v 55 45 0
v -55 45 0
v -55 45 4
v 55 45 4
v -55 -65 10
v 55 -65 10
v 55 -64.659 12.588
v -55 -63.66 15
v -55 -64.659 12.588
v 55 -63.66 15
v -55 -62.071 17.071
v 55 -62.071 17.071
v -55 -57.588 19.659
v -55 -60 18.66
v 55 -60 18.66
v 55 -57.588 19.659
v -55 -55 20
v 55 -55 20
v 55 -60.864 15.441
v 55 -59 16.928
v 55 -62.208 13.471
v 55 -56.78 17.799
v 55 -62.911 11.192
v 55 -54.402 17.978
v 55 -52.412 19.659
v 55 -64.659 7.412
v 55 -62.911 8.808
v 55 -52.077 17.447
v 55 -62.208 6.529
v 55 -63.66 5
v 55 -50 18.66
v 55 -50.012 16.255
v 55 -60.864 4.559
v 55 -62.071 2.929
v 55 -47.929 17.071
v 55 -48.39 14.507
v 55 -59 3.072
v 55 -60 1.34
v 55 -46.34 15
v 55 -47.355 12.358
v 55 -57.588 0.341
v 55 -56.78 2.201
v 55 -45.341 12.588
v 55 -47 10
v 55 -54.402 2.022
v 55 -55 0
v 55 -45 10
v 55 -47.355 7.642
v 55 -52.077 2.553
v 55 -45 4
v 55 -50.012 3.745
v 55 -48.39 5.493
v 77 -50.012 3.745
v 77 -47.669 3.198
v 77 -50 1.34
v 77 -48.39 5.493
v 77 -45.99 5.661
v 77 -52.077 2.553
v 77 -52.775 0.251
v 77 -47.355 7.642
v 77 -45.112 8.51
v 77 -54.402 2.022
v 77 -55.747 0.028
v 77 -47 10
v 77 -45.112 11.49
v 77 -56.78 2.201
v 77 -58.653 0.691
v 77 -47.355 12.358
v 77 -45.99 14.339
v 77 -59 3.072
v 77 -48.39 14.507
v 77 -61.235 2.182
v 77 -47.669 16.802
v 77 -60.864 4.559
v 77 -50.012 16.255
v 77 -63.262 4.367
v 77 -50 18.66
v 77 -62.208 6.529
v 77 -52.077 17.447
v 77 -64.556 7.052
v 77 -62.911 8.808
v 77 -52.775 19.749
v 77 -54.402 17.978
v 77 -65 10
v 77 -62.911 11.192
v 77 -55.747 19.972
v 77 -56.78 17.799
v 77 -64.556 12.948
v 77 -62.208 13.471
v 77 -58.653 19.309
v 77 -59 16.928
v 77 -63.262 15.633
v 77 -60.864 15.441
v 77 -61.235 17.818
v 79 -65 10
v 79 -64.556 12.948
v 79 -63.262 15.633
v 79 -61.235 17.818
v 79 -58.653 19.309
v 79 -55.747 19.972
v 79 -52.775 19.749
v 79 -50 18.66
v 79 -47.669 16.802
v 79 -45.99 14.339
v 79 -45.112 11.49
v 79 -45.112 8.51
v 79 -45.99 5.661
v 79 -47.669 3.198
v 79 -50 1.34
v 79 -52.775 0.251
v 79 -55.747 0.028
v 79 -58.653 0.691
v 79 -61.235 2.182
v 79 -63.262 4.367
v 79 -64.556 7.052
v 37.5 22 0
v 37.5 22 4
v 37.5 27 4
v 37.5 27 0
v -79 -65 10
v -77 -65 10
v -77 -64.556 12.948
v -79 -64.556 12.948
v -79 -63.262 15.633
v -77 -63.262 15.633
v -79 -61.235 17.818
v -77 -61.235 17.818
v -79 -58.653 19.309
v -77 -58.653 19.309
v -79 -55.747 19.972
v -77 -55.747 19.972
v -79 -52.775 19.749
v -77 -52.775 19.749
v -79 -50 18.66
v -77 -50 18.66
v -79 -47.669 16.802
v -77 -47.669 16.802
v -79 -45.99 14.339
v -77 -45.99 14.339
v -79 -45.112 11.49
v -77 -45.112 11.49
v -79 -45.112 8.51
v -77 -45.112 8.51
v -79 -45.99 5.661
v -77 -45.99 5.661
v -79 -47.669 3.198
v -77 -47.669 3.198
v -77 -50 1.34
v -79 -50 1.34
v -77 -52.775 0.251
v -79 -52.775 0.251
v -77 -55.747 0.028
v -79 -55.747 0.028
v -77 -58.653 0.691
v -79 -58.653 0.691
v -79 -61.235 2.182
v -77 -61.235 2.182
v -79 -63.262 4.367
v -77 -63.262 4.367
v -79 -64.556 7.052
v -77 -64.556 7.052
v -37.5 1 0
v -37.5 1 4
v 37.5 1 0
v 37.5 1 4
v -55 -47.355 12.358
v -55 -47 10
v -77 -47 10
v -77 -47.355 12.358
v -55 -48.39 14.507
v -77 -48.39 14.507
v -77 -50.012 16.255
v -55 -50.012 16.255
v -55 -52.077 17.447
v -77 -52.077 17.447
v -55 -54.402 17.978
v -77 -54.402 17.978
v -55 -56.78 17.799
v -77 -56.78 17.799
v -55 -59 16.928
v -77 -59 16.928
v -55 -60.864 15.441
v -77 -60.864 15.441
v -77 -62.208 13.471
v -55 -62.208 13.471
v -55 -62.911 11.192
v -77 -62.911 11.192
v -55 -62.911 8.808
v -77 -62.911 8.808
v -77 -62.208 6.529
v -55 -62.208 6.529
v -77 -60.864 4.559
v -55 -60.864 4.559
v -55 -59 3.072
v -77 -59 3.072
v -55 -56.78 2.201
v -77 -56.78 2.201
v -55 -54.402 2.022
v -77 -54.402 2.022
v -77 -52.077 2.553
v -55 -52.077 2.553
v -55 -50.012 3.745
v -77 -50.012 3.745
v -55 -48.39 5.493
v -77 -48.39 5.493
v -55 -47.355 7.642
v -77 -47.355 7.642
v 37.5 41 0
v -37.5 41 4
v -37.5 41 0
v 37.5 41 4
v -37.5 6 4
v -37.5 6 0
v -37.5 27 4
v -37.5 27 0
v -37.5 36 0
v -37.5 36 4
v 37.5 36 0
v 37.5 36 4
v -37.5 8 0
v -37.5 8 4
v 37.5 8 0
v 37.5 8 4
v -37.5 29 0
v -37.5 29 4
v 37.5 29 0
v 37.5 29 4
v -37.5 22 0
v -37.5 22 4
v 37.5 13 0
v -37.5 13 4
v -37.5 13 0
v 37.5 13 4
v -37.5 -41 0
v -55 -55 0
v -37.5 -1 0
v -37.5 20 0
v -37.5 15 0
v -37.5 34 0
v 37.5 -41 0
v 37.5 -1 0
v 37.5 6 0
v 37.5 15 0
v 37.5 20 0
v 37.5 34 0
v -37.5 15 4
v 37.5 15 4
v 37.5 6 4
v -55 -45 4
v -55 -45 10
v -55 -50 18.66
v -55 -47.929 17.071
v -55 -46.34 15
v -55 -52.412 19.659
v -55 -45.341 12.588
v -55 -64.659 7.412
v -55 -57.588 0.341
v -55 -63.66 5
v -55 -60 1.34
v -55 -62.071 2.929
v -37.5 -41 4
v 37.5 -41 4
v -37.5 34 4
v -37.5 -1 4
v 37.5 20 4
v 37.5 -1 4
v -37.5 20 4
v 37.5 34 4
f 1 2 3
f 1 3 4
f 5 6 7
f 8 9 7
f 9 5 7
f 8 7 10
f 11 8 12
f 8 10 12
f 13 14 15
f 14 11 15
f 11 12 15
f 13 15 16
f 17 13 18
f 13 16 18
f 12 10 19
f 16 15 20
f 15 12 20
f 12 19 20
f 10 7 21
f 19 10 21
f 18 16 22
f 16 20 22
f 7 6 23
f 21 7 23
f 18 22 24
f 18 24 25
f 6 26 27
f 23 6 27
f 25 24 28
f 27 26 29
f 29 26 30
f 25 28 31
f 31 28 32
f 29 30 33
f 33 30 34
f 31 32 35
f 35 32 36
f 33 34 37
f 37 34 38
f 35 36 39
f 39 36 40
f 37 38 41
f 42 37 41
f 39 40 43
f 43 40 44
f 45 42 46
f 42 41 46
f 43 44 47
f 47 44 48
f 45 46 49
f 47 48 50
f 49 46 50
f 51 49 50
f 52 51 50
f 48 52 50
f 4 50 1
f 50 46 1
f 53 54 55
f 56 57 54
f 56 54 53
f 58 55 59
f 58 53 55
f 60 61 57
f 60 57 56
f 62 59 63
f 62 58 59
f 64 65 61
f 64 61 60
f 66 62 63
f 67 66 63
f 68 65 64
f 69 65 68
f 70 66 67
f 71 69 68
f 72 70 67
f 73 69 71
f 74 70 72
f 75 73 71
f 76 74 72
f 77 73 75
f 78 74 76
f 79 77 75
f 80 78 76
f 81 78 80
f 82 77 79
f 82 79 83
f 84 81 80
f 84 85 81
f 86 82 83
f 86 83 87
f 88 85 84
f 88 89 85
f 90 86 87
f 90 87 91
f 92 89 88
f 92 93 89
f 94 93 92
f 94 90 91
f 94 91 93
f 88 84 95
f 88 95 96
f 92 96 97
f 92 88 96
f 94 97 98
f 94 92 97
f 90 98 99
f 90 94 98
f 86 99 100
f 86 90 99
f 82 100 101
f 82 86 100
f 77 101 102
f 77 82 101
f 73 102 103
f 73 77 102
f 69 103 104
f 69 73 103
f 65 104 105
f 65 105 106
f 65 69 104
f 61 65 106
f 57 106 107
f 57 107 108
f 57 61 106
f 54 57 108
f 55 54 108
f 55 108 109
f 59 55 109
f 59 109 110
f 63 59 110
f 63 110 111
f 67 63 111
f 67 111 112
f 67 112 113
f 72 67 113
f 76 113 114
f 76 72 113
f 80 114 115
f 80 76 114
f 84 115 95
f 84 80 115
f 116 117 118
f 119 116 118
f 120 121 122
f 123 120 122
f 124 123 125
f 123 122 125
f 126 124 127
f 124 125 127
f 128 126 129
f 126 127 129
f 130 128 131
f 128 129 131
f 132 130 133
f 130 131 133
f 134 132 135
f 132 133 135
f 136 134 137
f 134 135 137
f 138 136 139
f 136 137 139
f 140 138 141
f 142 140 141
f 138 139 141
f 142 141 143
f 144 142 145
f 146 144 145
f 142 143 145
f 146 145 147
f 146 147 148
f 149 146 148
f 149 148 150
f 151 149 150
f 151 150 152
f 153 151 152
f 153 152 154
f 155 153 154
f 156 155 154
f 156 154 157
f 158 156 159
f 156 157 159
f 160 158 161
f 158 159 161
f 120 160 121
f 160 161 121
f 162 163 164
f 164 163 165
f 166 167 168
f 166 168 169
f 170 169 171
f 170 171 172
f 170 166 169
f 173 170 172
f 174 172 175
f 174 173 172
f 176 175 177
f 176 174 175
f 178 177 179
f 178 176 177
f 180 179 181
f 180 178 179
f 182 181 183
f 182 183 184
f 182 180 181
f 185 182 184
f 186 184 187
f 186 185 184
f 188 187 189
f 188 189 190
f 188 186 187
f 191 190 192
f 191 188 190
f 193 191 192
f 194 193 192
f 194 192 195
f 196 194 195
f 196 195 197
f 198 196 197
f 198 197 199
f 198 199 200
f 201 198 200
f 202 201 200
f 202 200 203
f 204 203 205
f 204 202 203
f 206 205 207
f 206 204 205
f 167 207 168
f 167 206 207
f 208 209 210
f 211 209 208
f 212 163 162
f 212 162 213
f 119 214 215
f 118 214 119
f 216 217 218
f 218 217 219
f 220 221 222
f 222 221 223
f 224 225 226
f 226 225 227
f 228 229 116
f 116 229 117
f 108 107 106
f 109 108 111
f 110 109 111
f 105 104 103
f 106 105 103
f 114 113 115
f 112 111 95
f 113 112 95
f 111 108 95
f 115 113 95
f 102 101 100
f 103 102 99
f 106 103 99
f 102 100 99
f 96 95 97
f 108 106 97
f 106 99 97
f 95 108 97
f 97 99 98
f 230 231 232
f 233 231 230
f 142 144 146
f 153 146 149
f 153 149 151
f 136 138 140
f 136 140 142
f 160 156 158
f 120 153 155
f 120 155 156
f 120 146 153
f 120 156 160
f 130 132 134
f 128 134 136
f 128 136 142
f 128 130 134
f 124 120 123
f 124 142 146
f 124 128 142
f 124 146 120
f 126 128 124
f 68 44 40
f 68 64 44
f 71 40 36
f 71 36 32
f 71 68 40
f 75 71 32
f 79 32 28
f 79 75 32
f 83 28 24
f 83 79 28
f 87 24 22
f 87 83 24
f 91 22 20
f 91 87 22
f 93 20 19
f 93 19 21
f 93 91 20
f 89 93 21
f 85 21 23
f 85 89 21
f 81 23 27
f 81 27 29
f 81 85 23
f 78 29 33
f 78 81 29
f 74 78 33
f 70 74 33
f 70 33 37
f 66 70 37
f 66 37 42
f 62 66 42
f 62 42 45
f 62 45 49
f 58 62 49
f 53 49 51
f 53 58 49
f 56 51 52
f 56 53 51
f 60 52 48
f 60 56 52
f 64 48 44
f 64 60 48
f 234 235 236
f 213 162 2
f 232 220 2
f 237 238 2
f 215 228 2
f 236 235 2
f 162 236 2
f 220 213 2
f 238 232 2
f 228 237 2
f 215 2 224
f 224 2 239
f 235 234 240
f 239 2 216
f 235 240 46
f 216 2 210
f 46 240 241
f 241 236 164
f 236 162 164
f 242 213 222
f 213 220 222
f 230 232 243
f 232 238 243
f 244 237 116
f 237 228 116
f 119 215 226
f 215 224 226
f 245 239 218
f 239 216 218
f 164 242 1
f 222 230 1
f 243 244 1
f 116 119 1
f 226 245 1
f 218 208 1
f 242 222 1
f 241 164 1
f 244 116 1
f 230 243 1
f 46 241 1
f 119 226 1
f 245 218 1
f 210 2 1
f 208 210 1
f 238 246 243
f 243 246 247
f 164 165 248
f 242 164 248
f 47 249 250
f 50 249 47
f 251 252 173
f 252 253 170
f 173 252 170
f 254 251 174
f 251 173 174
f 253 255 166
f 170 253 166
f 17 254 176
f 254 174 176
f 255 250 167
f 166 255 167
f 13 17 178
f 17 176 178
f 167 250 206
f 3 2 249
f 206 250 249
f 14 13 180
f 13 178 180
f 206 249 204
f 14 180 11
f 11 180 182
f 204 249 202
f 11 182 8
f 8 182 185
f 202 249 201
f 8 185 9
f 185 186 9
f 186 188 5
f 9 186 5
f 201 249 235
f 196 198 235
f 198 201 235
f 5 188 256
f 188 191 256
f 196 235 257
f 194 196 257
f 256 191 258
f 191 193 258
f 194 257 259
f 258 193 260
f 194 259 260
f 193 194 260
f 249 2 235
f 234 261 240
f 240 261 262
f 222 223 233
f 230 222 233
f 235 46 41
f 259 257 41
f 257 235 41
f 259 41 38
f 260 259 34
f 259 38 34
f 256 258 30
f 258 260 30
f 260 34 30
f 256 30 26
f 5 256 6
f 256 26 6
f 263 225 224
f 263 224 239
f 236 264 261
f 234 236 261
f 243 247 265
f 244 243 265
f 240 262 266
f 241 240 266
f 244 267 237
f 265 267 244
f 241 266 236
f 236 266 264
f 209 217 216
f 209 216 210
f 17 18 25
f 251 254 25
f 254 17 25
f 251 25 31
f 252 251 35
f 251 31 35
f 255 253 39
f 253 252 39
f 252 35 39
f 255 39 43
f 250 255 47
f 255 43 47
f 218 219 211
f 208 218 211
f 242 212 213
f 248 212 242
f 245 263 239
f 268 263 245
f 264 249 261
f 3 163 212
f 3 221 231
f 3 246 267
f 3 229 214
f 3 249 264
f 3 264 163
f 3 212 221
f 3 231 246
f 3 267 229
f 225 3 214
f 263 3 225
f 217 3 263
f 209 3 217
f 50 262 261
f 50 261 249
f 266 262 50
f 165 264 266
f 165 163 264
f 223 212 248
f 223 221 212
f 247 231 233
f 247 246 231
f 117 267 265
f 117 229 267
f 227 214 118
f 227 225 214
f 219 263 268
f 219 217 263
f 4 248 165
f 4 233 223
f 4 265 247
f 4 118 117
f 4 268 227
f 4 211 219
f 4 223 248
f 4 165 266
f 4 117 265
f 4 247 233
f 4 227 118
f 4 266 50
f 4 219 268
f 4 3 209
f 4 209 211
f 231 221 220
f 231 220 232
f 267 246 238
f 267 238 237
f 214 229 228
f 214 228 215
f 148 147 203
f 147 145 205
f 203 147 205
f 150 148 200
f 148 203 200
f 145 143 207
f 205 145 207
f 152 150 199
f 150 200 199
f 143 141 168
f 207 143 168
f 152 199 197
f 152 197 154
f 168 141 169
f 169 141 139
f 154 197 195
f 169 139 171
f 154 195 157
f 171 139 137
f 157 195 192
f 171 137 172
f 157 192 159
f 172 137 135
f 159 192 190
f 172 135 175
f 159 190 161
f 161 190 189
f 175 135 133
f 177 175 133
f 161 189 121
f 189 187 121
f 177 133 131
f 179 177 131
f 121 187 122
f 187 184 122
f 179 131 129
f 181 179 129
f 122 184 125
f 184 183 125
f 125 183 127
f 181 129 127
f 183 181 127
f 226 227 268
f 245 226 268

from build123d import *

# Parameters (mm, degrees)
F0_W     = 110
F0_H     = 20
F0_H_2   = 90
F1_DEPTH = 4
F2_DEPTH = 20
F4_DEPTH = 100
F3_R     = 8
F5_DEPTH = 77
F6_R     = 10
F6_R_2   = 8
F7_DEPTH = 2
F8_W     = 75
F8_H     = 5
F9_DEPTH = 25


# Not quite as in the source:
# - a pattern or mirror of a feature is missing from the dataset's text; its kind, count and spacing are read off the source's solid
# - a feature names something its author has since deleted; it is built from what else it names


with BuildPart() as f1:
    # F0 (on Top) → F1 (new body)
    with BuildSketch(Plane.XY):
        with Locations((0, -55)):
            Rectangle(F0_W, F0_H)
        Rectangle(F0_W, F0_H_2)
    extrude(amount=F1_DEPTH)

    # F0 (on Top) → F2 (join)
    with BuildSketch(Plane.XY):
        with Locations((0, -55)):
            Rectangle(F0_W, F0_H)
    extrude(amount=F2_DEPTH)

    # F3 (on Right) → F4 (cut, symmetric)
    with BuildSketch(Plane.YZ):
        with BuildLine():
            Line((-65, 2), (-65, 0))
            Line((-65, 0), (-55, 0))
            ThreePointArc((-55, 0), (-62.0710678119, 2.9289321881), (-65, 10))
            Line((-65, 10), (-65, 2))
        make_face()
        with BuildLine():
            Line((-65, 20), (-65, 10))
            ThreePointArc((-65, 10), (-62.0710678119, 17.0710678119), (-55, 20))
            Line((-55, 20), (-65, 20))
        make_face()
        with BuildLine():
            ThreePointArc((-55, 20), (-47.9289321881, 17.0710678119), (-45, 10))
            Line((-45, 10), (-45, 20))
            Line((-45, 20), (-55, 20))
        make_face()
    extrude(amount=F4_DEPTH, both=True, mode=Mode.SUBTRACT)

    # F3 (on Right) → F5 (join, symmetric)
    with BuildSketch(Plane.YZ):
        with Locations((-55, 10)):
            Circle(F3_R)
    extrude(amount=F5_DEPTH, both=True)

    # F6 (on face) → F7 (join)
    with BuildSketch(Plane(origin=(-77, 0, 0), x_dir=(0, -1, 0), z_dir=(-1, 0, 0))):
        with Locations((55, 10)):
            Circle(F6_R)
        with Locations((55, 10)):
            Circle(F6_R_2, mode=Mode.SUBTRACT)
        with Locations((55, 10)):
            Circle(F6_R_2)
    f7 = extrude(amount=F7_DEPTH)

    # F7_copies: F7 across plane
    add(f7.mirror(Plane(origin=(0, 0, 0), x_dir=(0, 0, 1), z_dir=(1, 0, 0))))

    # F8 (on face) → F9 (cut)
    with BuildSketch(Plane.XY.offset(4)):
        with Locations((0, 3.5)):
            Rectangle(F8_W, F8_H)
        with Locations((0, 10.5)):
            Rectangle(F8_W, F8_H)
        with Locations((0, 31.5)):
            Rectangle(F8_W, F8_H)
        with Locations((0, 24.5)):
            Rectangle(F8_W, F8_H)
        with Locations((0, 17.5)):
            Rectangle(F8_W, F8_H)
        with Locations((0, 38.5)):
            Rectangle(F8_W, F8_H)
        Polygon((37.5, -8), (37.5, -6), (37.5, -1), (-37.5, -1), (-37.5, -6), (-37.5, -8), (-37.5, -13), (-37.5, -15), (-37.5, -20), (-37.5, -22), (-37.5, -27), (-37.5, -29), (-37.5, -34), (-37.5, -36), (-37.5, -41), (37.5, -41), (37.5, -36), (37.5, -34), (37.5, -29), (37.5, -27), (37.5, -22), (37.5, -20), (37.5, -15), (37.5, -13), align=None)
    extrude(amount=-F9_DEPTH, mode=Mode.SUBTRACT)


solid = f1.part
